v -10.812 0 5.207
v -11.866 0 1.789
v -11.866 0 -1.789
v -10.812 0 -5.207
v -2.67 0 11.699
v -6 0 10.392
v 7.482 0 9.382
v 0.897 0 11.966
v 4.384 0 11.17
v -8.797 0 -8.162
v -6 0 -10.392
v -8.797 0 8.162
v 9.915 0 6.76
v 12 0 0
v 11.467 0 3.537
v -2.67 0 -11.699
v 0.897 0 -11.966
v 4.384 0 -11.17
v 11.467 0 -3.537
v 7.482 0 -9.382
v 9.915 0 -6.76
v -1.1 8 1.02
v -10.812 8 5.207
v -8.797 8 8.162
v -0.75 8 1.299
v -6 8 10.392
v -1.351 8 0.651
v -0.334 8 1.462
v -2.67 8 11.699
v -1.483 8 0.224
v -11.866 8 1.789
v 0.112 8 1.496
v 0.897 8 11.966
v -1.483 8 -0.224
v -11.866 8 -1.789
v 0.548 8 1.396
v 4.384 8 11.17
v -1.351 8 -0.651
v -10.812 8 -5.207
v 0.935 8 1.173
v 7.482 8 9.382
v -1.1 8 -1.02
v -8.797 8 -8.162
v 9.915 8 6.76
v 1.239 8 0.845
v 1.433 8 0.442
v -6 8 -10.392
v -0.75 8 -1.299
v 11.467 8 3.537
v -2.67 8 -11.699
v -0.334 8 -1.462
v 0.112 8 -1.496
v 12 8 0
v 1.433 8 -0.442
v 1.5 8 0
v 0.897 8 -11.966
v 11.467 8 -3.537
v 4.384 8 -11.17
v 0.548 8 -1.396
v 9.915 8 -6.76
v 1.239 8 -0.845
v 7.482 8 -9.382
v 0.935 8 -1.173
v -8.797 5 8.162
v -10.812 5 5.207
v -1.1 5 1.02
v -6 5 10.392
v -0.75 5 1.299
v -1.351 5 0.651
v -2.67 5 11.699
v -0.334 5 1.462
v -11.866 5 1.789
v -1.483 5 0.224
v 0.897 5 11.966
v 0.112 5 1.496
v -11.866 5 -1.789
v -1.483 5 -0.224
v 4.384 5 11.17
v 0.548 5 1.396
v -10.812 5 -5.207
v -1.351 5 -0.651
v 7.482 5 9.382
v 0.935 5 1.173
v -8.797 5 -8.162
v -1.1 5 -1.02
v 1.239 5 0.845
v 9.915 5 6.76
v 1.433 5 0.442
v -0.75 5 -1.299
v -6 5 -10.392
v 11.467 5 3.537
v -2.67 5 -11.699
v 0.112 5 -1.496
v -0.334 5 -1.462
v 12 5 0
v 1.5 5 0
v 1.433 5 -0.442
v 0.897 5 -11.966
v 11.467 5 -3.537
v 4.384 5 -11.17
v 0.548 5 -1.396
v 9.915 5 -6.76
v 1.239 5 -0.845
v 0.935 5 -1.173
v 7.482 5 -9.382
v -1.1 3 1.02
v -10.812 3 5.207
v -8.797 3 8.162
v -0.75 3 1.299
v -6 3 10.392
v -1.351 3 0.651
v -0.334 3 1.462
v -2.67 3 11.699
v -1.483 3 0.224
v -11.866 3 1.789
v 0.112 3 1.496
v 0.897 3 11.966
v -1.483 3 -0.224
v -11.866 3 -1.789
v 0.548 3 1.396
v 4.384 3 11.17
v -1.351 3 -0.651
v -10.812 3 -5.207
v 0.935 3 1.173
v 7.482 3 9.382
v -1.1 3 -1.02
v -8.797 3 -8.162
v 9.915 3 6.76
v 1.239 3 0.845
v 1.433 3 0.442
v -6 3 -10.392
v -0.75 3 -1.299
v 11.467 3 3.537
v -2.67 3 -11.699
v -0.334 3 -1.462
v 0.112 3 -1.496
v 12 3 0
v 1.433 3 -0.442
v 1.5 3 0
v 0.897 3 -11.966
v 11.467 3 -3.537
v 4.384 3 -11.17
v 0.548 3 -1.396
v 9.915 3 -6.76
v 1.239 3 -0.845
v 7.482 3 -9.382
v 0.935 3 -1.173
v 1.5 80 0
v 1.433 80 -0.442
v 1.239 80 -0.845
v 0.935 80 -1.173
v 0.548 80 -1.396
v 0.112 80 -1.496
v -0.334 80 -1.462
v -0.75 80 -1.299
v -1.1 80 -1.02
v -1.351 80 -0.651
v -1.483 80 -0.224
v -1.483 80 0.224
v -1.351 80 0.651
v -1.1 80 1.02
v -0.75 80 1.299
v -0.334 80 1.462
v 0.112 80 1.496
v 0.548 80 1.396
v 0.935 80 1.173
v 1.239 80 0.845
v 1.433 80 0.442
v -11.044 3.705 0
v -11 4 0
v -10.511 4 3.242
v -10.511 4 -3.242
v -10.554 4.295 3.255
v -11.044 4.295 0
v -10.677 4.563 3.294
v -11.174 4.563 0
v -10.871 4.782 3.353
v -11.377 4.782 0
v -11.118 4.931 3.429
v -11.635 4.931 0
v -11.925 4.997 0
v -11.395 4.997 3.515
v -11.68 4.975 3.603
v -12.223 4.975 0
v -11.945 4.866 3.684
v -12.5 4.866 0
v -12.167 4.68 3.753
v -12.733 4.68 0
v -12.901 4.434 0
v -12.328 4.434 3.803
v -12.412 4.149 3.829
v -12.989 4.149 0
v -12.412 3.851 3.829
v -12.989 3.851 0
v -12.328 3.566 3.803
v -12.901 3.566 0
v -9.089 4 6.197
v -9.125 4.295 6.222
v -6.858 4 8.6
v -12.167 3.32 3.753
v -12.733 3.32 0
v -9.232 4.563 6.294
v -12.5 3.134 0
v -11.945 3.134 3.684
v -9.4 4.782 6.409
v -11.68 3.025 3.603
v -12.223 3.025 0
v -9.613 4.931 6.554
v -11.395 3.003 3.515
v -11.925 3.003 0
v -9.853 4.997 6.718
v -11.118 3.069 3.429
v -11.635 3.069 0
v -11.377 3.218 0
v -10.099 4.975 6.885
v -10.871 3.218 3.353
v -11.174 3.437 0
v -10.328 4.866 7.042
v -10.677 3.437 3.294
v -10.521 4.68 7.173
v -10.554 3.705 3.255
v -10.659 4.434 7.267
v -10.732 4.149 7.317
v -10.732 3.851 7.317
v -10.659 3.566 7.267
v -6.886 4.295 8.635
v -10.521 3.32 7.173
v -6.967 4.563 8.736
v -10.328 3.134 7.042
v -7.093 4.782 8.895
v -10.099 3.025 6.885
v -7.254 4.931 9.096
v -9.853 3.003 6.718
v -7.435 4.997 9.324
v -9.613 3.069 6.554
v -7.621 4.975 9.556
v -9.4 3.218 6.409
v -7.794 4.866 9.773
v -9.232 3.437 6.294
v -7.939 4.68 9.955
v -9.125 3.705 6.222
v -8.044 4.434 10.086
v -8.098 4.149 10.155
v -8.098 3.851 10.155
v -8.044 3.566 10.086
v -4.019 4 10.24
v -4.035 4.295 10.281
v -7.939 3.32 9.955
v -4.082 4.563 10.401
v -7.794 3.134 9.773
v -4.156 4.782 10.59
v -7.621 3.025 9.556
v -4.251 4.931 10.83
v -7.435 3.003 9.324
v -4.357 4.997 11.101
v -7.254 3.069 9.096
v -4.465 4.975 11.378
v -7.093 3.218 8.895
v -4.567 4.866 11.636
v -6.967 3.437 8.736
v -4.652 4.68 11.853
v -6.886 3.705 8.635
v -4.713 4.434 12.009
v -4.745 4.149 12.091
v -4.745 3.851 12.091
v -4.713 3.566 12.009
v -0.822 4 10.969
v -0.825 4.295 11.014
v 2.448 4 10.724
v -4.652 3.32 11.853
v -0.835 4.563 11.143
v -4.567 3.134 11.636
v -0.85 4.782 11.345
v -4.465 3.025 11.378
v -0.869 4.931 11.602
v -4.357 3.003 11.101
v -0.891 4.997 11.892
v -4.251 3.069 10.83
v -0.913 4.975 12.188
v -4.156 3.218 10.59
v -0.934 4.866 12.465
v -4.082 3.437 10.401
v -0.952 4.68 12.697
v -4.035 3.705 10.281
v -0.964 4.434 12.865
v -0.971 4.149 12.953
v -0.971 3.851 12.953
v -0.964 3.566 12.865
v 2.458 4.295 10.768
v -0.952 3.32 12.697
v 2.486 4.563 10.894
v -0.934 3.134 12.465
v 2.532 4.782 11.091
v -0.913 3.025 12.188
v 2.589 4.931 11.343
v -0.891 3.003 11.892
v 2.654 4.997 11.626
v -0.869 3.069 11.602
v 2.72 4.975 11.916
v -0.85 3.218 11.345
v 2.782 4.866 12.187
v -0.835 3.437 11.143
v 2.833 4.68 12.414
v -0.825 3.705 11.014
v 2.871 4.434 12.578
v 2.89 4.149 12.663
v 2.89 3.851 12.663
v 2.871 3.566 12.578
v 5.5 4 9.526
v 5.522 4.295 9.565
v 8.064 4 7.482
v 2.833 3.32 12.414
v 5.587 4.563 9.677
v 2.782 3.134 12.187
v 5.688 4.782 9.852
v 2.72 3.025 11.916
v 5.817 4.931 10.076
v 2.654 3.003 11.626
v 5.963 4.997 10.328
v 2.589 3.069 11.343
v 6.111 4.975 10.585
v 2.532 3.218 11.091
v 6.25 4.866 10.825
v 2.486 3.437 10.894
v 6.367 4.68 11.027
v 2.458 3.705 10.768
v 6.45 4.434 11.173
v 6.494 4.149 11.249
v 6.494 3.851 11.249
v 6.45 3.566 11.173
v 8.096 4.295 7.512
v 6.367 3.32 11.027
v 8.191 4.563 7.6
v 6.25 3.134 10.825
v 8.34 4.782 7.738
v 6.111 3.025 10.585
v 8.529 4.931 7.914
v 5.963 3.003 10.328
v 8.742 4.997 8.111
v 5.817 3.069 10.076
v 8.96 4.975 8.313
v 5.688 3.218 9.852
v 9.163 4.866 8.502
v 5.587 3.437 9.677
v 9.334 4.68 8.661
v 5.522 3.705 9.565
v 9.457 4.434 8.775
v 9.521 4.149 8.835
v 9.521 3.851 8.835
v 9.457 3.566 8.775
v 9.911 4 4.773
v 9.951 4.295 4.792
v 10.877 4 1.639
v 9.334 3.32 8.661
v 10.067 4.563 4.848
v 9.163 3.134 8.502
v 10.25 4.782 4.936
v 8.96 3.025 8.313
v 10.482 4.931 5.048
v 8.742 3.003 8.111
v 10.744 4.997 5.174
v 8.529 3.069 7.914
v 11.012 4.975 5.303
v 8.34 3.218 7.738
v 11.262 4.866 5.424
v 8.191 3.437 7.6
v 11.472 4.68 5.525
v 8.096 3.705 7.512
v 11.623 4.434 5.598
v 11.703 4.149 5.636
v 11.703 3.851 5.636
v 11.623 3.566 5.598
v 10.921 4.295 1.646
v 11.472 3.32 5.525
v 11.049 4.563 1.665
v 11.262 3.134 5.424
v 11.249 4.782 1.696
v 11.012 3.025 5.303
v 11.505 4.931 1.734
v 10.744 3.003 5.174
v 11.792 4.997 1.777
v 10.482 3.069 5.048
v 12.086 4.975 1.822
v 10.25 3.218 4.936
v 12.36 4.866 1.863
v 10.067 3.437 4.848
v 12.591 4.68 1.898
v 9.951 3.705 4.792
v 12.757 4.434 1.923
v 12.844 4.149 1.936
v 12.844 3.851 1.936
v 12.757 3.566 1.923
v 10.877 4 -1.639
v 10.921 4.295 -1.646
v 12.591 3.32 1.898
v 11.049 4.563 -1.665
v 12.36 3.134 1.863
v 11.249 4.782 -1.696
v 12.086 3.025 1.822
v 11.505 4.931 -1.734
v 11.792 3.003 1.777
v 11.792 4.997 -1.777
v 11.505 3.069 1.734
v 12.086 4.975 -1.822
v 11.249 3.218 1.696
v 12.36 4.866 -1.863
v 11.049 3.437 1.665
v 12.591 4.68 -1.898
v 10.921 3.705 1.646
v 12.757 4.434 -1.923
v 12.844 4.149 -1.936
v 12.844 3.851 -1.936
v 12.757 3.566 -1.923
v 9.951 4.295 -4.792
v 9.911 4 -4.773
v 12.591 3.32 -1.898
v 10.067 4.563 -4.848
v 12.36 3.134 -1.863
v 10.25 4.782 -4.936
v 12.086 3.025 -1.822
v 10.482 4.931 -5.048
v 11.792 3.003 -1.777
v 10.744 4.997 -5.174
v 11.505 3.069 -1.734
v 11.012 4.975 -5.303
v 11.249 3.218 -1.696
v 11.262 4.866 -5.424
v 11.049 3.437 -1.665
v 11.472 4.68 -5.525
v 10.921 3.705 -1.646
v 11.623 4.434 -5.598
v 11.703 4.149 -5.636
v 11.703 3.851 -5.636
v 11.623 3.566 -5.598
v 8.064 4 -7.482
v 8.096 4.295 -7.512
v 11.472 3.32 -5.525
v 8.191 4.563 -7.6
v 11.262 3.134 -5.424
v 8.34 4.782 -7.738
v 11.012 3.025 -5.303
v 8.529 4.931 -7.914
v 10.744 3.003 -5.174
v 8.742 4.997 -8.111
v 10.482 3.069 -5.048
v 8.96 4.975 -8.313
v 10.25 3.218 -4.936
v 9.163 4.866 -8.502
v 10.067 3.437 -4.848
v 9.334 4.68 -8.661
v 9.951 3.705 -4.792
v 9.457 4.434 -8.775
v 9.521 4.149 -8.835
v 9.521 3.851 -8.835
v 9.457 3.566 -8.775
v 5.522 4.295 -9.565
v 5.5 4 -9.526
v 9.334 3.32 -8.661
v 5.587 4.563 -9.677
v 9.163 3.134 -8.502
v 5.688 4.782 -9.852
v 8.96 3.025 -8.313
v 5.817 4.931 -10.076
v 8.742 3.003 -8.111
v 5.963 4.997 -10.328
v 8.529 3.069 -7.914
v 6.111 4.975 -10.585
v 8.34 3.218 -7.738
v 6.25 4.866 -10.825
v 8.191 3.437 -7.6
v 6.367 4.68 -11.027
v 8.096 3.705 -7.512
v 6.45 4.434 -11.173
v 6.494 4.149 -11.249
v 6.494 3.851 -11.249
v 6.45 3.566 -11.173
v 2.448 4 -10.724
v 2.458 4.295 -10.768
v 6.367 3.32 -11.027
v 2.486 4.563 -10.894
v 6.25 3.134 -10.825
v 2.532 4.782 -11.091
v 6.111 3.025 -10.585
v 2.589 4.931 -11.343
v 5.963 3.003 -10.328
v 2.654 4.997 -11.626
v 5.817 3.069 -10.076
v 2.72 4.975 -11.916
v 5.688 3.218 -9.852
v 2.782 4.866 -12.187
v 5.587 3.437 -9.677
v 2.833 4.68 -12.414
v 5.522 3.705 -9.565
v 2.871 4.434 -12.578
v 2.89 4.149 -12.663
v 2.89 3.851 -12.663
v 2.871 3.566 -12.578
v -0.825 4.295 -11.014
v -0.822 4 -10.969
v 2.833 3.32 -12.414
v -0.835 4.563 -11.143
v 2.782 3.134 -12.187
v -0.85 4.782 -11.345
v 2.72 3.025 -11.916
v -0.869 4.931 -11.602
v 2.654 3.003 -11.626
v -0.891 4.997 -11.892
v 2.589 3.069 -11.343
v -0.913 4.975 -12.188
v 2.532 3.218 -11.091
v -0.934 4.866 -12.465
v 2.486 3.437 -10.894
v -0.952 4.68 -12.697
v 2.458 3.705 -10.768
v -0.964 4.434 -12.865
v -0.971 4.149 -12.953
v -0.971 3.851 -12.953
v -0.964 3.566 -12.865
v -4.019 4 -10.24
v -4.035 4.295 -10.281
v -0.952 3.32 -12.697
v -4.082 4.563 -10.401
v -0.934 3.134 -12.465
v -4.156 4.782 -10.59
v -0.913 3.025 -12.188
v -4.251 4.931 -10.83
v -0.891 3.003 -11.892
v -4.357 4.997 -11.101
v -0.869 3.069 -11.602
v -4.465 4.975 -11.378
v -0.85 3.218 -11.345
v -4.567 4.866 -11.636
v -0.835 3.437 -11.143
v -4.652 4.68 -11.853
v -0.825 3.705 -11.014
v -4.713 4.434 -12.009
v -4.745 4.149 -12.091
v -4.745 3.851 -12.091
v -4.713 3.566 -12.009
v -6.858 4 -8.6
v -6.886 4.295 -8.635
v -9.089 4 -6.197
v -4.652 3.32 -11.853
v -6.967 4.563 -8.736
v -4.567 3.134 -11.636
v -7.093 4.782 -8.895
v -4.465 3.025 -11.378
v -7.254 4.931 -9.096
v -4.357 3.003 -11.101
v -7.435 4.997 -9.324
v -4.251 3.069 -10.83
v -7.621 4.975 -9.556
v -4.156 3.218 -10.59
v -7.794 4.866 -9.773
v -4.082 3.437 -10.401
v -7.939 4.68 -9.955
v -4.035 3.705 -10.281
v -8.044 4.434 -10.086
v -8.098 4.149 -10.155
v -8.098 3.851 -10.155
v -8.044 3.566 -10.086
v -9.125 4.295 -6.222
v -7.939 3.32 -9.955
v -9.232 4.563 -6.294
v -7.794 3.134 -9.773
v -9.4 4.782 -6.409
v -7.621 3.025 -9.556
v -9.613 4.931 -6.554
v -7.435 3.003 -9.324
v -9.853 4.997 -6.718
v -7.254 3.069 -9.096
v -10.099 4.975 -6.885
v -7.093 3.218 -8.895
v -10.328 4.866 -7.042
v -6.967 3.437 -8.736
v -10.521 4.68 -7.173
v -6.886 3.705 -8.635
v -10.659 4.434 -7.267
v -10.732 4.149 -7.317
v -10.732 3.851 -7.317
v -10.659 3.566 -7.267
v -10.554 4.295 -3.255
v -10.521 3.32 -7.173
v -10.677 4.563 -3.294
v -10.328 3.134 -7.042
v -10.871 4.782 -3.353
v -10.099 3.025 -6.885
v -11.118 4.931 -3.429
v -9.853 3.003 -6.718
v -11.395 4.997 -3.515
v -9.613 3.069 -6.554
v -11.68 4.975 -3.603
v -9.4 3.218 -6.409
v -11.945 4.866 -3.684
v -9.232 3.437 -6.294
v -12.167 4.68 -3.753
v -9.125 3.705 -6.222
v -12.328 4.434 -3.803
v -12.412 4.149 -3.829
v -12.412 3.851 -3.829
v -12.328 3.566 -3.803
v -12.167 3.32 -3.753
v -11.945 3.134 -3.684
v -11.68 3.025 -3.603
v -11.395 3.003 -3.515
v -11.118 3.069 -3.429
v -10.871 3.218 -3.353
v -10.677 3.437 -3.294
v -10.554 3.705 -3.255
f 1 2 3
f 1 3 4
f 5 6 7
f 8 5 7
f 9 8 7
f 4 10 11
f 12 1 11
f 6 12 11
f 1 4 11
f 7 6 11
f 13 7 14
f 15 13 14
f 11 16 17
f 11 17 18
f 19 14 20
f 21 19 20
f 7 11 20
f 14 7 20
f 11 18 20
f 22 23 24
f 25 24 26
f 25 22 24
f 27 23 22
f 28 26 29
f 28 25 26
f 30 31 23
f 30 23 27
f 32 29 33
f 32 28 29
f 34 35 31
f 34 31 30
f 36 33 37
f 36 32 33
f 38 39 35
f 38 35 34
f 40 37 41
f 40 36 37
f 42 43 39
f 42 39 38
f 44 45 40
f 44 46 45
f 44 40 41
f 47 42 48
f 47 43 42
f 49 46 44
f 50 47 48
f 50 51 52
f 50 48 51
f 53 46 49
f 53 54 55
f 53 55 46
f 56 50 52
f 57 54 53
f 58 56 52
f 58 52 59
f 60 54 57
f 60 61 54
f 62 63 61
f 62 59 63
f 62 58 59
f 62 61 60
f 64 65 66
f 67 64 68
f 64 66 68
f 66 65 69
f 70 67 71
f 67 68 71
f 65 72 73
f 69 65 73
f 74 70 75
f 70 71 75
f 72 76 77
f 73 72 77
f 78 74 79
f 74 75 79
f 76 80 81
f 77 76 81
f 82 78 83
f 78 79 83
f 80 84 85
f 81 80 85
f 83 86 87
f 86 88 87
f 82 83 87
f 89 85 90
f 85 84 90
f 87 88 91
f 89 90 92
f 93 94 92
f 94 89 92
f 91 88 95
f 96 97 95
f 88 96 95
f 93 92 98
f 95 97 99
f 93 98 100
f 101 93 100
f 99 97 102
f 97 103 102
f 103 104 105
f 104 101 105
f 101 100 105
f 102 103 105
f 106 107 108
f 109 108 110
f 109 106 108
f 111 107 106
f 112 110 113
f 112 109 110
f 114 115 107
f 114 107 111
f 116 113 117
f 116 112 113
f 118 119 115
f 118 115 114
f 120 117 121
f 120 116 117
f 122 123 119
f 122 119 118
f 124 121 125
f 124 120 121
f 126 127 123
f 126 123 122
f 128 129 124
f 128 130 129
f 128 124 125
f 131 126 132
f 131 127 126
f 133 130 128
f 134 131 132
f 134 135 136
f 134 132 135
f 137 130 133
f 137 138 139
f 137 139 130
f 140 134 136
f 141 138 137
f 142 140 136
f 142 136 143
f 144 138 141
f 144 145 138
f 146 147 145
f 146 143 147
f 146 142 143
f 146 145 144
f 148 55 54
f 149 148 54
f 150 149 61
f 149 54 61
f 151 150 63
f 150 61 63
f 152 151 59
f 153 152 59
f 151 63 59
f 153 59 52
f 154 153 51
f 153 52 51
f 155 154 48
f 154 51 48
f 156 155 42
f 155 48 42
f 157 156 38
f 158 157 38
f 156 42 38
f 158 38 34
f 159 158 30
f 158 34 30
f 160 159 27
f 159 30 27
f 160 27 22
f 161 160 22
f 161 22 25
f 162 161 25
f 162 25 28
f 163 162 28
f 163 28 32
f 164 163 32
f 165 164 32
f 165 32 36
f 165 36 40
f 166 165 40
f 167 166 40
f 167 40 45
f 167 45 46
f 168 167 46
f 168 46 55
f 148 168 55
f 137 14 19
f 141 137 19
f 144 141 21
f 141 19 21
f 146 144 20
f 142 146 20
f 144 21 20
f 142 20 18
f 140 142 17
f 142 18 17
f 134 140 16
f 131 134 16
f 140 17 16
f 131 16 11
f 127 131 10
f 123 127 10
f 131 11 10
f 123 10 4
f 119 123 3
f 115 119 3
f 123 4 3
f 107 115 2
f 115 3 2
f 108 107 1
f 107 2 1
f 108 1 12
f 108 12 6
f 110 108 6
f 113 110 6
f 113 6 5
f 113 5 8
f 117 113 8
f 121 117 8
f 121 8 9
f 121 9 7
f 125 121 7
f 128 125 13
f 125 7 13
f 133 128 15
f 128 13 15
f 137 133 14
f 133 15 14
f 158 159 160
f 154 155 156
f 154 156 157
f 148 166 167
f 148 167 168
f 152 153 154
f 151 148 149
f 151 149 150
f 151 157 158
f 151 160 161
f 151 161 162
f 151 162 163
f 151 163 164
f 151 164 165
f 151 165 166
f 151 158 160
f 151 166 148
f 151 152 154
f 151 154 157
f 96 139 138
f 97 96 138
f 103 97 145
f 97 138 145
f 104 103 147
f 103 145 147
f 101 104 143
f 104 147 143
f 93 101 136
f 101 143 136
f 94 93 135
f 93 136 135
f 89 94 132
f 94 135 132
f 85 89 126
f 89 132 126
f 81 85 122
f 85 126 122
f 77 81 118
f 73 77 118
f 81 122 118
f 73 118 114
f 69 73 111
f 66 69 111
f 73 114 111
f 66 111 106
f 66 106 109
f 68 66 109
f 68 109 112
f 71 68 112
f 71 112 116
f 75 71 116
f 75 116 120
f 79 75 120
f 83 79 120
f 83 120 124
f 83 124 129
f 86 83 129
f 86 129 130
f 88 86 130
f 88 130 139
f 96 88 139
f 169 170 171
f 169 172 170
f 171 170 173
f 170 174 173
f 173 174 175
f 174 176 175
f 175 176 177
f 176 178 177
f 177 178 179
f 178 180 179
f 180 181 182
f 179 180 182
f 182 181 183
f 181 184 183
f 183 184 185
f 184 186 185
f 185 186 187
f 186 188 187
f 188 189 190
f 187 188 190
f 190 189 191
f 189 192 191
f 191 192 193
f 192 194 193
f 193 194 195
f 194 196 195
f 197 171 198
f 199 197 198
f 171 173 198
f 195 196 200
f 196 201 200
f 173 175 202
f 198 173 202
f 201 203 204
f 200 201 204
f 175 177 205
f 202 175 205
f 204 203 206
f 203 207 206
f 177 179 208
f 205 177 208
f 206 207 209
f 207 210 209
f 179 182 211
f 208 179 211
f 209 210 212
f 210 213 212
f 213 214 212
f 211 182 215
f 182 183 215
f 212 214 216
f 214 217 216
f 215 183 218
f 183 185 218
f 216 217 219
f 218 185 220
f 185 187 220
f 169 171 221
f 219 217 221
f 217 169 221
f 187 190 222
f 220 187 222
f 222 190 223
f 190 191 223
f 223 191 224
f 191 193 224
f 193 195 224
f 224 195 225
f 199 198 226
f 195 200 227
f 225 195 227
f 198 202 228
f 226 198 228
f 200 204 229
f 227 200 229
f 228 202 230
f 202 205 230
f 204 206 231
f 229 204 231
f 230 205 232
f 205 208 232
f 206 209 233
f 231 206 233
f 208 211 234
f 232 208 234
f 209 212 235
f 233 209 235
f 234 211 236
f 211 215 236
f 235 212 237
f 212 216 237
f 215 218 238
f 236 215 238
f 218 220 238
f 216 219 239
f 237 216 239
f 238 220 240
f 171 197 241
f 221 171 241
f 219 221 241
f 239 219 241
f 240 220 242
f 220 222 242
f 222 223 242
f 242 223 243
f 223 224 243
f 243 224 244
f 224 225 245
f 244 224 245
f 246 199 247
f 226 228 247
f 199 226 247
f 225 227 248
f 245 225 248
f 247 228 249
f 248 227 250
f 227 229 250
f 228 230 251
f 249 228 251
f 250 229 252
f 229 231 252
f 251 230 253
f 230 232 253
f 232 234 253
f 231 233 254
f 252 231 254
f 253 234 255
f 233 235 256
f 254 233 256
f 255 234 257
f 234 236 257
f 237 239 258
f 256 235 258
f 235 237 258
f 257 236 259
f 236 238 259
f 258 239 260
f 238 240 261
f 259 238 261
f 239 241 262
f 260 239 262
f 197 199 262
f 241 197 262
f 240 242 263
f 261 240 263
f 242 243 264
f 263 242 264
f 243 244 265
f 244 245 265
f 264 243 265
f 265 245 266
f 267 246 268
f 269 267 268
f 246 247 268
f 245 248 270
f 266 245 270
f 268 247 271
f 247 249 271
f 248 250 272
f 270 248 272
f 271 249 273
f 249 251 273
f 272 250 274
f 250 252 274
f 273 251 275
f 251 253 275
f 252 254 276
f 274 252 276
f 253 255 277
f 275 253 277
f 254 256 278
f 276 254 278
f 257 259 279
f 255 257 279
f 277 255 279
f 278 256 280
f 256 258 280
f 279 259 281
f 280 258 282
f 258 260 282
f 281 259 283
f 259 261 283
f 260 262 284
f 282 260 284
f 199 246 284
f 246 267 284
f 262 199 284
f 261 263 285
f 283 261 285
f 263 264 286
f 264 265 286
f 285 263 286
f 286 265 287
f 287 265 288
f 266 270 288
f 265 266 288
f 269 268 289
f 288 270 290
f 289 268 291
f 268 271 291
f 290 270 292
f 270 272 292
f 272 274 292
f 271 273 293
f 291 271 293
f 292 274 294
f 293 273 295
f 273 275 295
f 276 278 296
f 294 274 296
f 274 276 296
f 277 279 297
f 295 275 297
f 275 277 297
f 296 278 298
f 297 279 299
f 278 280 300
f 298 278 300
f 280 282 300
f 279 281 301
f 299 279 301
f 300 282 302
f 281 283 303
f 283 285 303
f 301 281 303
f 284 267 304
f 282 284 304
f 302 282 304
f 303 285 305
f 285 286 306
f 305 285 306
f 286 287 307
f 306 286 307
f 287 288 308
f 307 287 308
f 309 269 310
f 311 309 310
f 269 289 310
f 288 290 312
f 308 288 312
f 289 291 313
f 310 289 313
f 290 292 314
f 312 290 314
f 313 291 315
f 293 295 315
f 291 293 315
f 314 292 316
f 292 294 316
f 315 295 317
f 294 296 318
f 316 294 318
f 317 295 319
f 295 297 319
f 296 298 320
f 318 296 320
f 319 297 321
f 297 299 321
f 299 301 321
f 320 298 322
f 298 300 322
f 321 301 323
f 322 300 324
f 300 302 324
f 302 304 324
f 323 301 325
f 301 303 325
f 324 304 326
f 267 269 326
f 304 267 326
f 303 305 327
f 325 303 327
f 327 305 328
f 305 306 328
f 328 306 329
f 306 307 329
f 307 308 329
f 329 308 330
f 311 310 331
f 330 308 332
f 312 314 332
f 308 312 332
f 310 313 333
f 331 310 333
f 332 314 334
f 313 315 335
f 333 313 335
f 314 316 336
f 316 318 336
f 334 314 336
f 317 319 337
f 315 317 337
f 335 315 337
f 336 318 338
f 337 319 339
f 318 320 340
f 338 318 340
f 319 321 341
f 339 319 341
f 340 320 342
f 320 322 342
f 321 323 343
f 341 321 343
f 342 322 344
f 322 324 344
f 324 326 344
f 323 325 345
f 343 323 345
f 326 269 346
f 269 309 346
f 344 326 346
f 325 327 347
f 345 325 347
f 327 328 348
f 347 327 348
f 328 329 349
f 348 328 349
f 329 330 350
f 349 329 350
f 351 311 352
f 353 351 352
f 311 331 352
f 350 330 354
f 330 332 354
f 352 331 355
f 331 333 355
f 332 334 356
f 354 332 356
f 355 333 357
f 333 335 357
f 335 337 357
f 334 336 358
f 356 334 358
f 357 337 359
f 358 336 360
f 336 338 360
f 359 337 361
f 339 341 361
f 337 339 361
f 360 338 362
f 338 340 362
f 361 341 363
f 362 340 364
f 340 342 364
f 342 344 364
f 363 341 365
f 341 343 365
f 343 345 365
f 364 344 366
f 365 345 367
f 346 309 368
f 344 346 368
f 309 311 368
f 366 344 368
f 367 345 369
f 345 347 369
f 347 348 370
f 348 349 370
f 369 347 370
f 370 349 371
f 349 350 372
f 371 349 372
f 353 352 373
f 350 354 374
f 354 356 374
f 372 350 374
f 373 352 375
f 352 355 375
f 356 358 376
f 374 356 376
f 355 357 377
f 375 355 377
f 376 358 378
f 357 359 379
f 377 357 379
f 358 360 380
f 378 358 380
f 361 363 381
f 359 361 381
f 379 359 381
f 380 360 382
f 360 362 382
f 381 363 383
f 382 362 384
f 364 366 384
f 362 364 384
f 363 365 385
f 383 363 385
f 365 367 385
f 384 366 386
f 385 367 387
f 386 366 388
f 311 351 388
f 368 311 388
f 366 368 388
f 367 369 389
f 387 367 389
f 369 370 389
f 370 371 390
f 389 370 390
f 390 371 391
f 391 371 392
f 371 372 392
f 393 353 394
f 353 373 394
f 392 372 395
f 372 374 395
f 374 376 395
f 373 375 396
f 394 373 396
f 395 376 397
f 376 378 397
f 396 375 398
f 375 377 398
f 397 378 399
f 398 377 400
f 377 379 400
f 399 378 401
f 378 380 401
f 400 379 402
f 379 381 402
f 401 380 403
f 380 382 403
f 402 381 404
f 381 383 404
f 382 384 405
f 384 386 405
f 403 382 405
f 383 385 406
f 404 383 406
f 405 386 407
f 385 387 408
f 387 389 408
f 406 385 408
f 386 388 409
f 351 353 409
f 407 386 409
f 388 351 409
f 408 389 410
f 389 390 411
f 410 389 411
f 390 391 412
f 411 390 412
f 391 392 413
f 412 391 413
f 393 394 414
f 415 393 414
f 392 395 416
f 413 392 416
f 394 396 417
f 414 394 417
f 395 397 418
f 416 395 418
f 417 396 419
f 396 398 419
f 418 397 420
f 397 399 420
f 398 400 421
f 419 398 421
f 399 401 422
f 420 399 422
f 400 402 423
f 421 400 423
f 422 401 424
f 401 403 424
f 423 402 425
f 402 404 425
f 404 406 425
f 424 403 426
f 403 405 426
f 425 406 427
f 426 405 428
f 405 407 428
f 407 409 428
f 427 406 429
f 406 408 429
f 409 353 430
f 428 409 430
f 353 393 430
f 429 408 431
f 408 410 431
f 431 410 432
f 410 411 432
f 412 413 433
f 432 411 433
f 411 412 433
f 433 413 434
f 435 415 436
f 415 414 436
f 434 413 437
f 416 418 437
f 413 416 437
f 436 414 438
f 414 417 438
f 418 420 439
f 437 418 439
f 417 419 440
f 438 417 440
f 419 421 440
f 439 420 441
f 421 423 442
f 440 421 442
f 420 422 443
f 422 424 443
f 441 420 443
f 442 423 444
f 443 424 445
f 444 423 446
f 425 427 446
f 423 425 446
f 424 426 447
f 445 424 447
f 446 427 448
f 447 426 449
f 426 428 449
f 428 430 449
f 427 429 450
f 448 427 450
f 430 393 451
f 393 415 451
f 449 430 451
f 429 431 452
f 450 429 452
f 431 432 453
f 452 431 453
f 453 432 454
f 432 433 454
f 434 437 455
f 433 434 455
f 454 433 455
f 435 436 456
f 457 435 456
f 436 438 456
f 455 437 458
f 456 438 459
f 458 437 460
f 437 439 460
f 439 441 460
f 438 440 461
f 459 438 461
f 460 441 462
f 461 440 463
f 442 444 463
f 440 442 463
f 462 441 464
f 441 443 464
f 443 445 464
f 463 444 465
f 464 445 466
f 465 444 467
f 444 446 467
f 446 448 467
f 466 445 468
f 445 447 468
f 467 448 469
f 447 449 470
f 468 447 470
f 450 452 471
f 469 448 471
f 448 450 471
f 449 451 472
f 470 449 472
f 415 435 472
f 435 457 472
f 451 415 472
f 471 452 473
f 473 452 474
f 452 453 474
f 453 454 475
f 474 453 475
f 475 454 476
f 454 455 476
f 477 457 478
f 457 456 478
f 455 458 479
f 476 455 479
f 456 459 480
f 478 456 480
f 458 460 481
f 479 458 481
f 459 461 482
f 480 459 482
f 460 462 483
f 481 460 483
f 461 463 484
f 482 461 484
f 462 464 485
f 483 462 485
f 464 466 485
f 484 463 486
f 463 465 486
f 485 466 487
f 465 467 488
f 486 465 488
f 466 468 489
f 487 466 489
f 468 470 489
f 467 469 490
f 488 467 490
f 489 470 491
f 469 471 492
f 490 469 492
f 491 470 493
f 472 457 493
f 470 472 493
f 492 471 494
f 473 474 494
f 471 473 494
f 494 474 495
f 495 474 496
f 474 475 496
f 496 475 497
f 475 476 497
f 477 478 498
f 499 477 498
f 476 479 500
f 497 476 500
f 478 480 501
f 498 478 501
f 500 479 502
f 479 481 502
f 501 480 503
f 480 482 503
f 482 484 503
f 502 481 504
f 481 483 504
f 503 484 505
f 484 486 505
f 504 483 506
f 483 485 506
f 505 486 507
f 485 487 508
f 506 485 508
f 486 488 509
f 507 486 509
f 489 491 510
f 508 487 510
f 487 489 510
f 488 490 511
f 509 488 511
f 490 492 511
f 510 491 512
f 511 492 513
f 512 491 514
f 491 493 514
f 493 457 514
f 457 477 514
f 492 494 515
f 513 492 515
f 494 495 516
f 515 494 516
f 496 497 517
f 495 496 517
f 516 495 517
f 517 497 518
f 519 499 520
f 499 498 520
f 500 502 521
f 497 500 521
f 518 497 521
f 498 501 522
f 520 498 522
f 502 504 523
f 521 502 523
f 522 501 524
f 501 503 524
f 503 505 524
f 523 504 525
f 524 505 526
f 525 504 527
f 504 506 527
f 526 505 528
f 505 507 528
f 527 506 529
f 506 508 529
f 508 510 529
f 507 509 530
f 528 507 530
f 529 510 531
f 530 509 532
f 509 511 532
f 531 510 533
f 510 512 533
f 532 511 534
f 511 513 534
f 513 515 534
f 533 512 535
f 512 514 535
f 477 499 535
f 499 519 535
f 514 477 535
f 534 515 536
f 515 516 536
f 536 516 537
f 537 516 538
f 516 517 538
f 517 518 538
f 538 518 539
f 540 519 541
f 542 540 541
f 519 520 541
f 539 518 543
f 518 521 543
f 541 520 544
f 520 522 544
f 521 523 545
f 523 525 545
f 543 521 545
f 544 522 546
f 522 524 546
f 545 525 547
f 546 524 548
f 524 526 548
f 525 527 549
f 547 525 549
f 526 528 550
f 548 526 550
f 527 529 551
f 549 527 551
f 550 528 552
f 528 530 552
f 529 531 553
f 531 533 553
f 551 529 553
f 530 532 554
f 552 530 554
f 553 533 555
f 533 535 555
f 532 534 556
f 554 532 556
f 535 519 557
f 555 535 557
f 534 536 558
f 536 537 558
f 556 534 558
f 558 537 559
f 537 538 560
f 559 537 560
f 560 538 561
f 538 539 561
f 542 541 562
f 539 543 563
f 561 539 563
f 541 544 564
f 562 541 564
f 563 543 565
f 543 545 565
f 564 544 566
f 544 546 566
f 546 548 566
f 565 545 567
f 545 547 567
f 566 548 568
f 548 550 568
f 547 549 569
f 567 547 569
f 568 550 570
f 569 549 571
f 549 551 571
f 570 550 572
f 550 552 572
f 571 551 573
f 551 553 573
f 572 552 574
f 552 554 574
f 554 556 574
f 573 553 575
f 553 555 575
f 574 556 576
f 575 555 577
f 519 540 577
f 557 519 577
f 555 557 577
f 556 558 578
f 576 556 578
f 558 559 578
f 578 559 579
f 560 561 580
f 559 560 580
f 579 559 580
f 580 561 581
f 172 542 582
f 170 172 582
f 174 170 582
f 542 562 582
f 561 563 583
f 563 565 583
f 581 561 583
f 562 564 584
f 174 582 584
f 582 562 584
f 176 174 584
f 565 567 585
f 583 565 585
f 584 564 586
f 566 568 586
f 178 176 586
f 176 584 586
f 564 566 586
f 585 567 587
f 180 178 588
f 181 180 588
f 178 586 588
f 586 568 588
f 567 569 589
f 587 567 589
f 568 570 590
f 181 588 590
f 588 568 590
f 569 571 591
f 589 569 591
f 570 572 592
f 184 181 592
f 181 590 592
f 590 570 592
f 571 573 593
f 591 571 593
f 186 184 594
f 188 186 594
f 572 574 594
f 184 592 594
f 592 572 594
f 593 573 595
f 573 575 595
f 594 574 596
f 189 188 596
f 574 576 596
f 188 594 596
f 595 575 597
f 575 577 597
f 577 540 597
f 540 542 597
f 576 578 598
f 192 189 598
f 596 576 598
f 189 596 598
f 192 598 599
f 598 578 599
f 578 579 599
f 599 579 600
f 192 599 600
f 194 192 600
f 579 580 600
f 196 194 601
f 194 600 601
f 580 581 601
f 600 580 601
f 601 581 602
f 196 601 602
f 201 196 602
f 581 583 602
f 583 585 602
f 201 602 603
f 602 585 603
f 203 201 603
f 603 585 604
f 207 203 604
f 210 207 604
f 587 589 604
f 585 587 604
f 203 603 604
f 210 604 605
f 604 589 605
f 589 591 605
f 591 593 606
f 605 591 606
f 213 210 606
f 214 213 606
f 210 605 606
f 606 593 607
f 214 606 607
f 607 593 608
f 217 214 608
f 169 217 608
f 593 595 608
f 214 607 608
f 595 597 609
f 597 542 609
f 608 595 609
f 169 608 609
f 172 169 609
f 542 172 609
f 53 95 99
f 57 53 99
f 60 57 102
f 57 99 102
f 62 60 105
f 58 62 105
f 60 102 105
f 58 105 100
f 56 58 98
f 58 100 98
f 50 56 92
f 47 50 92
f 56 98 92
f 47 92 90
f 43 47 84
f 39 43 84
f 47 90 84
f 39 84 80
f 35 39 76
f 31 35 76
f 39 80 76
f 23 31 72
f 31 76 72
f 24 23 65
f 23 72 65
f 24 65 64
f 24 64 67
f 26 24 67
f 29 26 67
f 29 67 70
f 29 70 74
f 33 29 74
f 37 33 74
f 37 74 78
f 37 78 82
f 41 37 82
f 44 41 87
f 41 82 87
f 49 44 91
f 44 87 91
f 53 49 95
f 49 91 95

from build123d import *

# Parameters (mm, degrees)
SKETCH1_R           = 12
SKETCH1_R_2         = 1.5
BOSS_EXTRUDE1_DEPTH = 3
SKETCH3_R           = 1
BOSS_EXTRUDE2_START = 5
SKETCH1_2_R         = 12
SKETCH1_2_R_2       = 1.5
BOSS_EXTRUDE2_DEPTH = 3
SKETCH1_3_R         = 1.5
BOSS_EXTRUDE3_DEPTH = 80


with BuildPart() as part:
    # Sketch1 → Boss-Extrude1 (new body)
    with BuildSketch(Plane(origin=(0, 0, 0), x_dir=(1, 0, 0), z_dir=(0, 1, 0))):
        Circle(SKETCH1_R)
        Circle(SKETCH1_R_2, mode=Mode.SUBTRACT)
    extrude(amount=BOSS_EXTRUDE1_DEPTH)



with BuildPart() as body_2:
    # Sketch3 → Revolve1 (revolve)
    with BuildSketch(Plane.XY):
        with Locations((-12, 4)):
            Circle(SKETCH3_R)
    revolve(axis=Axis((0, 3, 0), (0, 1, 0)))


with BuildPart() as body_3:
    # Sketch1<2> → Boss-Extrude2 (new body)
    with BuildSketch(Plane(origin=(0, 0, 0), x_dir=(1, 0, 0), z_dir=(0, 1, 0)).offset(BOSS_EXTRUDE2_START)):
        Circle(SKETCH1_2_R)
        Circle(SKETCH1_2_R_2, mode=Mode.SUBTRACT)
    extrude(amount=BOSS_EXTRUDE2_DEPTH)


with BuildPart() as part_1:
    add(part.part)

    add(body_3.part)  # Boss-Extrude3 merges body 3
    # Sketch1<3> → Boss-Extrude3 (add)
    with BuildSketch(Plane(origin=(0, 0, 0), x_dir=(1, 0, 0), z_dir=(0, 1, 0))):
        Circle(SKETCH1_3_R)
    extrude(amount=BOSS_EXTRUDE3_DEPTH)


solid = Compound([body_2.part, part_1.part])
